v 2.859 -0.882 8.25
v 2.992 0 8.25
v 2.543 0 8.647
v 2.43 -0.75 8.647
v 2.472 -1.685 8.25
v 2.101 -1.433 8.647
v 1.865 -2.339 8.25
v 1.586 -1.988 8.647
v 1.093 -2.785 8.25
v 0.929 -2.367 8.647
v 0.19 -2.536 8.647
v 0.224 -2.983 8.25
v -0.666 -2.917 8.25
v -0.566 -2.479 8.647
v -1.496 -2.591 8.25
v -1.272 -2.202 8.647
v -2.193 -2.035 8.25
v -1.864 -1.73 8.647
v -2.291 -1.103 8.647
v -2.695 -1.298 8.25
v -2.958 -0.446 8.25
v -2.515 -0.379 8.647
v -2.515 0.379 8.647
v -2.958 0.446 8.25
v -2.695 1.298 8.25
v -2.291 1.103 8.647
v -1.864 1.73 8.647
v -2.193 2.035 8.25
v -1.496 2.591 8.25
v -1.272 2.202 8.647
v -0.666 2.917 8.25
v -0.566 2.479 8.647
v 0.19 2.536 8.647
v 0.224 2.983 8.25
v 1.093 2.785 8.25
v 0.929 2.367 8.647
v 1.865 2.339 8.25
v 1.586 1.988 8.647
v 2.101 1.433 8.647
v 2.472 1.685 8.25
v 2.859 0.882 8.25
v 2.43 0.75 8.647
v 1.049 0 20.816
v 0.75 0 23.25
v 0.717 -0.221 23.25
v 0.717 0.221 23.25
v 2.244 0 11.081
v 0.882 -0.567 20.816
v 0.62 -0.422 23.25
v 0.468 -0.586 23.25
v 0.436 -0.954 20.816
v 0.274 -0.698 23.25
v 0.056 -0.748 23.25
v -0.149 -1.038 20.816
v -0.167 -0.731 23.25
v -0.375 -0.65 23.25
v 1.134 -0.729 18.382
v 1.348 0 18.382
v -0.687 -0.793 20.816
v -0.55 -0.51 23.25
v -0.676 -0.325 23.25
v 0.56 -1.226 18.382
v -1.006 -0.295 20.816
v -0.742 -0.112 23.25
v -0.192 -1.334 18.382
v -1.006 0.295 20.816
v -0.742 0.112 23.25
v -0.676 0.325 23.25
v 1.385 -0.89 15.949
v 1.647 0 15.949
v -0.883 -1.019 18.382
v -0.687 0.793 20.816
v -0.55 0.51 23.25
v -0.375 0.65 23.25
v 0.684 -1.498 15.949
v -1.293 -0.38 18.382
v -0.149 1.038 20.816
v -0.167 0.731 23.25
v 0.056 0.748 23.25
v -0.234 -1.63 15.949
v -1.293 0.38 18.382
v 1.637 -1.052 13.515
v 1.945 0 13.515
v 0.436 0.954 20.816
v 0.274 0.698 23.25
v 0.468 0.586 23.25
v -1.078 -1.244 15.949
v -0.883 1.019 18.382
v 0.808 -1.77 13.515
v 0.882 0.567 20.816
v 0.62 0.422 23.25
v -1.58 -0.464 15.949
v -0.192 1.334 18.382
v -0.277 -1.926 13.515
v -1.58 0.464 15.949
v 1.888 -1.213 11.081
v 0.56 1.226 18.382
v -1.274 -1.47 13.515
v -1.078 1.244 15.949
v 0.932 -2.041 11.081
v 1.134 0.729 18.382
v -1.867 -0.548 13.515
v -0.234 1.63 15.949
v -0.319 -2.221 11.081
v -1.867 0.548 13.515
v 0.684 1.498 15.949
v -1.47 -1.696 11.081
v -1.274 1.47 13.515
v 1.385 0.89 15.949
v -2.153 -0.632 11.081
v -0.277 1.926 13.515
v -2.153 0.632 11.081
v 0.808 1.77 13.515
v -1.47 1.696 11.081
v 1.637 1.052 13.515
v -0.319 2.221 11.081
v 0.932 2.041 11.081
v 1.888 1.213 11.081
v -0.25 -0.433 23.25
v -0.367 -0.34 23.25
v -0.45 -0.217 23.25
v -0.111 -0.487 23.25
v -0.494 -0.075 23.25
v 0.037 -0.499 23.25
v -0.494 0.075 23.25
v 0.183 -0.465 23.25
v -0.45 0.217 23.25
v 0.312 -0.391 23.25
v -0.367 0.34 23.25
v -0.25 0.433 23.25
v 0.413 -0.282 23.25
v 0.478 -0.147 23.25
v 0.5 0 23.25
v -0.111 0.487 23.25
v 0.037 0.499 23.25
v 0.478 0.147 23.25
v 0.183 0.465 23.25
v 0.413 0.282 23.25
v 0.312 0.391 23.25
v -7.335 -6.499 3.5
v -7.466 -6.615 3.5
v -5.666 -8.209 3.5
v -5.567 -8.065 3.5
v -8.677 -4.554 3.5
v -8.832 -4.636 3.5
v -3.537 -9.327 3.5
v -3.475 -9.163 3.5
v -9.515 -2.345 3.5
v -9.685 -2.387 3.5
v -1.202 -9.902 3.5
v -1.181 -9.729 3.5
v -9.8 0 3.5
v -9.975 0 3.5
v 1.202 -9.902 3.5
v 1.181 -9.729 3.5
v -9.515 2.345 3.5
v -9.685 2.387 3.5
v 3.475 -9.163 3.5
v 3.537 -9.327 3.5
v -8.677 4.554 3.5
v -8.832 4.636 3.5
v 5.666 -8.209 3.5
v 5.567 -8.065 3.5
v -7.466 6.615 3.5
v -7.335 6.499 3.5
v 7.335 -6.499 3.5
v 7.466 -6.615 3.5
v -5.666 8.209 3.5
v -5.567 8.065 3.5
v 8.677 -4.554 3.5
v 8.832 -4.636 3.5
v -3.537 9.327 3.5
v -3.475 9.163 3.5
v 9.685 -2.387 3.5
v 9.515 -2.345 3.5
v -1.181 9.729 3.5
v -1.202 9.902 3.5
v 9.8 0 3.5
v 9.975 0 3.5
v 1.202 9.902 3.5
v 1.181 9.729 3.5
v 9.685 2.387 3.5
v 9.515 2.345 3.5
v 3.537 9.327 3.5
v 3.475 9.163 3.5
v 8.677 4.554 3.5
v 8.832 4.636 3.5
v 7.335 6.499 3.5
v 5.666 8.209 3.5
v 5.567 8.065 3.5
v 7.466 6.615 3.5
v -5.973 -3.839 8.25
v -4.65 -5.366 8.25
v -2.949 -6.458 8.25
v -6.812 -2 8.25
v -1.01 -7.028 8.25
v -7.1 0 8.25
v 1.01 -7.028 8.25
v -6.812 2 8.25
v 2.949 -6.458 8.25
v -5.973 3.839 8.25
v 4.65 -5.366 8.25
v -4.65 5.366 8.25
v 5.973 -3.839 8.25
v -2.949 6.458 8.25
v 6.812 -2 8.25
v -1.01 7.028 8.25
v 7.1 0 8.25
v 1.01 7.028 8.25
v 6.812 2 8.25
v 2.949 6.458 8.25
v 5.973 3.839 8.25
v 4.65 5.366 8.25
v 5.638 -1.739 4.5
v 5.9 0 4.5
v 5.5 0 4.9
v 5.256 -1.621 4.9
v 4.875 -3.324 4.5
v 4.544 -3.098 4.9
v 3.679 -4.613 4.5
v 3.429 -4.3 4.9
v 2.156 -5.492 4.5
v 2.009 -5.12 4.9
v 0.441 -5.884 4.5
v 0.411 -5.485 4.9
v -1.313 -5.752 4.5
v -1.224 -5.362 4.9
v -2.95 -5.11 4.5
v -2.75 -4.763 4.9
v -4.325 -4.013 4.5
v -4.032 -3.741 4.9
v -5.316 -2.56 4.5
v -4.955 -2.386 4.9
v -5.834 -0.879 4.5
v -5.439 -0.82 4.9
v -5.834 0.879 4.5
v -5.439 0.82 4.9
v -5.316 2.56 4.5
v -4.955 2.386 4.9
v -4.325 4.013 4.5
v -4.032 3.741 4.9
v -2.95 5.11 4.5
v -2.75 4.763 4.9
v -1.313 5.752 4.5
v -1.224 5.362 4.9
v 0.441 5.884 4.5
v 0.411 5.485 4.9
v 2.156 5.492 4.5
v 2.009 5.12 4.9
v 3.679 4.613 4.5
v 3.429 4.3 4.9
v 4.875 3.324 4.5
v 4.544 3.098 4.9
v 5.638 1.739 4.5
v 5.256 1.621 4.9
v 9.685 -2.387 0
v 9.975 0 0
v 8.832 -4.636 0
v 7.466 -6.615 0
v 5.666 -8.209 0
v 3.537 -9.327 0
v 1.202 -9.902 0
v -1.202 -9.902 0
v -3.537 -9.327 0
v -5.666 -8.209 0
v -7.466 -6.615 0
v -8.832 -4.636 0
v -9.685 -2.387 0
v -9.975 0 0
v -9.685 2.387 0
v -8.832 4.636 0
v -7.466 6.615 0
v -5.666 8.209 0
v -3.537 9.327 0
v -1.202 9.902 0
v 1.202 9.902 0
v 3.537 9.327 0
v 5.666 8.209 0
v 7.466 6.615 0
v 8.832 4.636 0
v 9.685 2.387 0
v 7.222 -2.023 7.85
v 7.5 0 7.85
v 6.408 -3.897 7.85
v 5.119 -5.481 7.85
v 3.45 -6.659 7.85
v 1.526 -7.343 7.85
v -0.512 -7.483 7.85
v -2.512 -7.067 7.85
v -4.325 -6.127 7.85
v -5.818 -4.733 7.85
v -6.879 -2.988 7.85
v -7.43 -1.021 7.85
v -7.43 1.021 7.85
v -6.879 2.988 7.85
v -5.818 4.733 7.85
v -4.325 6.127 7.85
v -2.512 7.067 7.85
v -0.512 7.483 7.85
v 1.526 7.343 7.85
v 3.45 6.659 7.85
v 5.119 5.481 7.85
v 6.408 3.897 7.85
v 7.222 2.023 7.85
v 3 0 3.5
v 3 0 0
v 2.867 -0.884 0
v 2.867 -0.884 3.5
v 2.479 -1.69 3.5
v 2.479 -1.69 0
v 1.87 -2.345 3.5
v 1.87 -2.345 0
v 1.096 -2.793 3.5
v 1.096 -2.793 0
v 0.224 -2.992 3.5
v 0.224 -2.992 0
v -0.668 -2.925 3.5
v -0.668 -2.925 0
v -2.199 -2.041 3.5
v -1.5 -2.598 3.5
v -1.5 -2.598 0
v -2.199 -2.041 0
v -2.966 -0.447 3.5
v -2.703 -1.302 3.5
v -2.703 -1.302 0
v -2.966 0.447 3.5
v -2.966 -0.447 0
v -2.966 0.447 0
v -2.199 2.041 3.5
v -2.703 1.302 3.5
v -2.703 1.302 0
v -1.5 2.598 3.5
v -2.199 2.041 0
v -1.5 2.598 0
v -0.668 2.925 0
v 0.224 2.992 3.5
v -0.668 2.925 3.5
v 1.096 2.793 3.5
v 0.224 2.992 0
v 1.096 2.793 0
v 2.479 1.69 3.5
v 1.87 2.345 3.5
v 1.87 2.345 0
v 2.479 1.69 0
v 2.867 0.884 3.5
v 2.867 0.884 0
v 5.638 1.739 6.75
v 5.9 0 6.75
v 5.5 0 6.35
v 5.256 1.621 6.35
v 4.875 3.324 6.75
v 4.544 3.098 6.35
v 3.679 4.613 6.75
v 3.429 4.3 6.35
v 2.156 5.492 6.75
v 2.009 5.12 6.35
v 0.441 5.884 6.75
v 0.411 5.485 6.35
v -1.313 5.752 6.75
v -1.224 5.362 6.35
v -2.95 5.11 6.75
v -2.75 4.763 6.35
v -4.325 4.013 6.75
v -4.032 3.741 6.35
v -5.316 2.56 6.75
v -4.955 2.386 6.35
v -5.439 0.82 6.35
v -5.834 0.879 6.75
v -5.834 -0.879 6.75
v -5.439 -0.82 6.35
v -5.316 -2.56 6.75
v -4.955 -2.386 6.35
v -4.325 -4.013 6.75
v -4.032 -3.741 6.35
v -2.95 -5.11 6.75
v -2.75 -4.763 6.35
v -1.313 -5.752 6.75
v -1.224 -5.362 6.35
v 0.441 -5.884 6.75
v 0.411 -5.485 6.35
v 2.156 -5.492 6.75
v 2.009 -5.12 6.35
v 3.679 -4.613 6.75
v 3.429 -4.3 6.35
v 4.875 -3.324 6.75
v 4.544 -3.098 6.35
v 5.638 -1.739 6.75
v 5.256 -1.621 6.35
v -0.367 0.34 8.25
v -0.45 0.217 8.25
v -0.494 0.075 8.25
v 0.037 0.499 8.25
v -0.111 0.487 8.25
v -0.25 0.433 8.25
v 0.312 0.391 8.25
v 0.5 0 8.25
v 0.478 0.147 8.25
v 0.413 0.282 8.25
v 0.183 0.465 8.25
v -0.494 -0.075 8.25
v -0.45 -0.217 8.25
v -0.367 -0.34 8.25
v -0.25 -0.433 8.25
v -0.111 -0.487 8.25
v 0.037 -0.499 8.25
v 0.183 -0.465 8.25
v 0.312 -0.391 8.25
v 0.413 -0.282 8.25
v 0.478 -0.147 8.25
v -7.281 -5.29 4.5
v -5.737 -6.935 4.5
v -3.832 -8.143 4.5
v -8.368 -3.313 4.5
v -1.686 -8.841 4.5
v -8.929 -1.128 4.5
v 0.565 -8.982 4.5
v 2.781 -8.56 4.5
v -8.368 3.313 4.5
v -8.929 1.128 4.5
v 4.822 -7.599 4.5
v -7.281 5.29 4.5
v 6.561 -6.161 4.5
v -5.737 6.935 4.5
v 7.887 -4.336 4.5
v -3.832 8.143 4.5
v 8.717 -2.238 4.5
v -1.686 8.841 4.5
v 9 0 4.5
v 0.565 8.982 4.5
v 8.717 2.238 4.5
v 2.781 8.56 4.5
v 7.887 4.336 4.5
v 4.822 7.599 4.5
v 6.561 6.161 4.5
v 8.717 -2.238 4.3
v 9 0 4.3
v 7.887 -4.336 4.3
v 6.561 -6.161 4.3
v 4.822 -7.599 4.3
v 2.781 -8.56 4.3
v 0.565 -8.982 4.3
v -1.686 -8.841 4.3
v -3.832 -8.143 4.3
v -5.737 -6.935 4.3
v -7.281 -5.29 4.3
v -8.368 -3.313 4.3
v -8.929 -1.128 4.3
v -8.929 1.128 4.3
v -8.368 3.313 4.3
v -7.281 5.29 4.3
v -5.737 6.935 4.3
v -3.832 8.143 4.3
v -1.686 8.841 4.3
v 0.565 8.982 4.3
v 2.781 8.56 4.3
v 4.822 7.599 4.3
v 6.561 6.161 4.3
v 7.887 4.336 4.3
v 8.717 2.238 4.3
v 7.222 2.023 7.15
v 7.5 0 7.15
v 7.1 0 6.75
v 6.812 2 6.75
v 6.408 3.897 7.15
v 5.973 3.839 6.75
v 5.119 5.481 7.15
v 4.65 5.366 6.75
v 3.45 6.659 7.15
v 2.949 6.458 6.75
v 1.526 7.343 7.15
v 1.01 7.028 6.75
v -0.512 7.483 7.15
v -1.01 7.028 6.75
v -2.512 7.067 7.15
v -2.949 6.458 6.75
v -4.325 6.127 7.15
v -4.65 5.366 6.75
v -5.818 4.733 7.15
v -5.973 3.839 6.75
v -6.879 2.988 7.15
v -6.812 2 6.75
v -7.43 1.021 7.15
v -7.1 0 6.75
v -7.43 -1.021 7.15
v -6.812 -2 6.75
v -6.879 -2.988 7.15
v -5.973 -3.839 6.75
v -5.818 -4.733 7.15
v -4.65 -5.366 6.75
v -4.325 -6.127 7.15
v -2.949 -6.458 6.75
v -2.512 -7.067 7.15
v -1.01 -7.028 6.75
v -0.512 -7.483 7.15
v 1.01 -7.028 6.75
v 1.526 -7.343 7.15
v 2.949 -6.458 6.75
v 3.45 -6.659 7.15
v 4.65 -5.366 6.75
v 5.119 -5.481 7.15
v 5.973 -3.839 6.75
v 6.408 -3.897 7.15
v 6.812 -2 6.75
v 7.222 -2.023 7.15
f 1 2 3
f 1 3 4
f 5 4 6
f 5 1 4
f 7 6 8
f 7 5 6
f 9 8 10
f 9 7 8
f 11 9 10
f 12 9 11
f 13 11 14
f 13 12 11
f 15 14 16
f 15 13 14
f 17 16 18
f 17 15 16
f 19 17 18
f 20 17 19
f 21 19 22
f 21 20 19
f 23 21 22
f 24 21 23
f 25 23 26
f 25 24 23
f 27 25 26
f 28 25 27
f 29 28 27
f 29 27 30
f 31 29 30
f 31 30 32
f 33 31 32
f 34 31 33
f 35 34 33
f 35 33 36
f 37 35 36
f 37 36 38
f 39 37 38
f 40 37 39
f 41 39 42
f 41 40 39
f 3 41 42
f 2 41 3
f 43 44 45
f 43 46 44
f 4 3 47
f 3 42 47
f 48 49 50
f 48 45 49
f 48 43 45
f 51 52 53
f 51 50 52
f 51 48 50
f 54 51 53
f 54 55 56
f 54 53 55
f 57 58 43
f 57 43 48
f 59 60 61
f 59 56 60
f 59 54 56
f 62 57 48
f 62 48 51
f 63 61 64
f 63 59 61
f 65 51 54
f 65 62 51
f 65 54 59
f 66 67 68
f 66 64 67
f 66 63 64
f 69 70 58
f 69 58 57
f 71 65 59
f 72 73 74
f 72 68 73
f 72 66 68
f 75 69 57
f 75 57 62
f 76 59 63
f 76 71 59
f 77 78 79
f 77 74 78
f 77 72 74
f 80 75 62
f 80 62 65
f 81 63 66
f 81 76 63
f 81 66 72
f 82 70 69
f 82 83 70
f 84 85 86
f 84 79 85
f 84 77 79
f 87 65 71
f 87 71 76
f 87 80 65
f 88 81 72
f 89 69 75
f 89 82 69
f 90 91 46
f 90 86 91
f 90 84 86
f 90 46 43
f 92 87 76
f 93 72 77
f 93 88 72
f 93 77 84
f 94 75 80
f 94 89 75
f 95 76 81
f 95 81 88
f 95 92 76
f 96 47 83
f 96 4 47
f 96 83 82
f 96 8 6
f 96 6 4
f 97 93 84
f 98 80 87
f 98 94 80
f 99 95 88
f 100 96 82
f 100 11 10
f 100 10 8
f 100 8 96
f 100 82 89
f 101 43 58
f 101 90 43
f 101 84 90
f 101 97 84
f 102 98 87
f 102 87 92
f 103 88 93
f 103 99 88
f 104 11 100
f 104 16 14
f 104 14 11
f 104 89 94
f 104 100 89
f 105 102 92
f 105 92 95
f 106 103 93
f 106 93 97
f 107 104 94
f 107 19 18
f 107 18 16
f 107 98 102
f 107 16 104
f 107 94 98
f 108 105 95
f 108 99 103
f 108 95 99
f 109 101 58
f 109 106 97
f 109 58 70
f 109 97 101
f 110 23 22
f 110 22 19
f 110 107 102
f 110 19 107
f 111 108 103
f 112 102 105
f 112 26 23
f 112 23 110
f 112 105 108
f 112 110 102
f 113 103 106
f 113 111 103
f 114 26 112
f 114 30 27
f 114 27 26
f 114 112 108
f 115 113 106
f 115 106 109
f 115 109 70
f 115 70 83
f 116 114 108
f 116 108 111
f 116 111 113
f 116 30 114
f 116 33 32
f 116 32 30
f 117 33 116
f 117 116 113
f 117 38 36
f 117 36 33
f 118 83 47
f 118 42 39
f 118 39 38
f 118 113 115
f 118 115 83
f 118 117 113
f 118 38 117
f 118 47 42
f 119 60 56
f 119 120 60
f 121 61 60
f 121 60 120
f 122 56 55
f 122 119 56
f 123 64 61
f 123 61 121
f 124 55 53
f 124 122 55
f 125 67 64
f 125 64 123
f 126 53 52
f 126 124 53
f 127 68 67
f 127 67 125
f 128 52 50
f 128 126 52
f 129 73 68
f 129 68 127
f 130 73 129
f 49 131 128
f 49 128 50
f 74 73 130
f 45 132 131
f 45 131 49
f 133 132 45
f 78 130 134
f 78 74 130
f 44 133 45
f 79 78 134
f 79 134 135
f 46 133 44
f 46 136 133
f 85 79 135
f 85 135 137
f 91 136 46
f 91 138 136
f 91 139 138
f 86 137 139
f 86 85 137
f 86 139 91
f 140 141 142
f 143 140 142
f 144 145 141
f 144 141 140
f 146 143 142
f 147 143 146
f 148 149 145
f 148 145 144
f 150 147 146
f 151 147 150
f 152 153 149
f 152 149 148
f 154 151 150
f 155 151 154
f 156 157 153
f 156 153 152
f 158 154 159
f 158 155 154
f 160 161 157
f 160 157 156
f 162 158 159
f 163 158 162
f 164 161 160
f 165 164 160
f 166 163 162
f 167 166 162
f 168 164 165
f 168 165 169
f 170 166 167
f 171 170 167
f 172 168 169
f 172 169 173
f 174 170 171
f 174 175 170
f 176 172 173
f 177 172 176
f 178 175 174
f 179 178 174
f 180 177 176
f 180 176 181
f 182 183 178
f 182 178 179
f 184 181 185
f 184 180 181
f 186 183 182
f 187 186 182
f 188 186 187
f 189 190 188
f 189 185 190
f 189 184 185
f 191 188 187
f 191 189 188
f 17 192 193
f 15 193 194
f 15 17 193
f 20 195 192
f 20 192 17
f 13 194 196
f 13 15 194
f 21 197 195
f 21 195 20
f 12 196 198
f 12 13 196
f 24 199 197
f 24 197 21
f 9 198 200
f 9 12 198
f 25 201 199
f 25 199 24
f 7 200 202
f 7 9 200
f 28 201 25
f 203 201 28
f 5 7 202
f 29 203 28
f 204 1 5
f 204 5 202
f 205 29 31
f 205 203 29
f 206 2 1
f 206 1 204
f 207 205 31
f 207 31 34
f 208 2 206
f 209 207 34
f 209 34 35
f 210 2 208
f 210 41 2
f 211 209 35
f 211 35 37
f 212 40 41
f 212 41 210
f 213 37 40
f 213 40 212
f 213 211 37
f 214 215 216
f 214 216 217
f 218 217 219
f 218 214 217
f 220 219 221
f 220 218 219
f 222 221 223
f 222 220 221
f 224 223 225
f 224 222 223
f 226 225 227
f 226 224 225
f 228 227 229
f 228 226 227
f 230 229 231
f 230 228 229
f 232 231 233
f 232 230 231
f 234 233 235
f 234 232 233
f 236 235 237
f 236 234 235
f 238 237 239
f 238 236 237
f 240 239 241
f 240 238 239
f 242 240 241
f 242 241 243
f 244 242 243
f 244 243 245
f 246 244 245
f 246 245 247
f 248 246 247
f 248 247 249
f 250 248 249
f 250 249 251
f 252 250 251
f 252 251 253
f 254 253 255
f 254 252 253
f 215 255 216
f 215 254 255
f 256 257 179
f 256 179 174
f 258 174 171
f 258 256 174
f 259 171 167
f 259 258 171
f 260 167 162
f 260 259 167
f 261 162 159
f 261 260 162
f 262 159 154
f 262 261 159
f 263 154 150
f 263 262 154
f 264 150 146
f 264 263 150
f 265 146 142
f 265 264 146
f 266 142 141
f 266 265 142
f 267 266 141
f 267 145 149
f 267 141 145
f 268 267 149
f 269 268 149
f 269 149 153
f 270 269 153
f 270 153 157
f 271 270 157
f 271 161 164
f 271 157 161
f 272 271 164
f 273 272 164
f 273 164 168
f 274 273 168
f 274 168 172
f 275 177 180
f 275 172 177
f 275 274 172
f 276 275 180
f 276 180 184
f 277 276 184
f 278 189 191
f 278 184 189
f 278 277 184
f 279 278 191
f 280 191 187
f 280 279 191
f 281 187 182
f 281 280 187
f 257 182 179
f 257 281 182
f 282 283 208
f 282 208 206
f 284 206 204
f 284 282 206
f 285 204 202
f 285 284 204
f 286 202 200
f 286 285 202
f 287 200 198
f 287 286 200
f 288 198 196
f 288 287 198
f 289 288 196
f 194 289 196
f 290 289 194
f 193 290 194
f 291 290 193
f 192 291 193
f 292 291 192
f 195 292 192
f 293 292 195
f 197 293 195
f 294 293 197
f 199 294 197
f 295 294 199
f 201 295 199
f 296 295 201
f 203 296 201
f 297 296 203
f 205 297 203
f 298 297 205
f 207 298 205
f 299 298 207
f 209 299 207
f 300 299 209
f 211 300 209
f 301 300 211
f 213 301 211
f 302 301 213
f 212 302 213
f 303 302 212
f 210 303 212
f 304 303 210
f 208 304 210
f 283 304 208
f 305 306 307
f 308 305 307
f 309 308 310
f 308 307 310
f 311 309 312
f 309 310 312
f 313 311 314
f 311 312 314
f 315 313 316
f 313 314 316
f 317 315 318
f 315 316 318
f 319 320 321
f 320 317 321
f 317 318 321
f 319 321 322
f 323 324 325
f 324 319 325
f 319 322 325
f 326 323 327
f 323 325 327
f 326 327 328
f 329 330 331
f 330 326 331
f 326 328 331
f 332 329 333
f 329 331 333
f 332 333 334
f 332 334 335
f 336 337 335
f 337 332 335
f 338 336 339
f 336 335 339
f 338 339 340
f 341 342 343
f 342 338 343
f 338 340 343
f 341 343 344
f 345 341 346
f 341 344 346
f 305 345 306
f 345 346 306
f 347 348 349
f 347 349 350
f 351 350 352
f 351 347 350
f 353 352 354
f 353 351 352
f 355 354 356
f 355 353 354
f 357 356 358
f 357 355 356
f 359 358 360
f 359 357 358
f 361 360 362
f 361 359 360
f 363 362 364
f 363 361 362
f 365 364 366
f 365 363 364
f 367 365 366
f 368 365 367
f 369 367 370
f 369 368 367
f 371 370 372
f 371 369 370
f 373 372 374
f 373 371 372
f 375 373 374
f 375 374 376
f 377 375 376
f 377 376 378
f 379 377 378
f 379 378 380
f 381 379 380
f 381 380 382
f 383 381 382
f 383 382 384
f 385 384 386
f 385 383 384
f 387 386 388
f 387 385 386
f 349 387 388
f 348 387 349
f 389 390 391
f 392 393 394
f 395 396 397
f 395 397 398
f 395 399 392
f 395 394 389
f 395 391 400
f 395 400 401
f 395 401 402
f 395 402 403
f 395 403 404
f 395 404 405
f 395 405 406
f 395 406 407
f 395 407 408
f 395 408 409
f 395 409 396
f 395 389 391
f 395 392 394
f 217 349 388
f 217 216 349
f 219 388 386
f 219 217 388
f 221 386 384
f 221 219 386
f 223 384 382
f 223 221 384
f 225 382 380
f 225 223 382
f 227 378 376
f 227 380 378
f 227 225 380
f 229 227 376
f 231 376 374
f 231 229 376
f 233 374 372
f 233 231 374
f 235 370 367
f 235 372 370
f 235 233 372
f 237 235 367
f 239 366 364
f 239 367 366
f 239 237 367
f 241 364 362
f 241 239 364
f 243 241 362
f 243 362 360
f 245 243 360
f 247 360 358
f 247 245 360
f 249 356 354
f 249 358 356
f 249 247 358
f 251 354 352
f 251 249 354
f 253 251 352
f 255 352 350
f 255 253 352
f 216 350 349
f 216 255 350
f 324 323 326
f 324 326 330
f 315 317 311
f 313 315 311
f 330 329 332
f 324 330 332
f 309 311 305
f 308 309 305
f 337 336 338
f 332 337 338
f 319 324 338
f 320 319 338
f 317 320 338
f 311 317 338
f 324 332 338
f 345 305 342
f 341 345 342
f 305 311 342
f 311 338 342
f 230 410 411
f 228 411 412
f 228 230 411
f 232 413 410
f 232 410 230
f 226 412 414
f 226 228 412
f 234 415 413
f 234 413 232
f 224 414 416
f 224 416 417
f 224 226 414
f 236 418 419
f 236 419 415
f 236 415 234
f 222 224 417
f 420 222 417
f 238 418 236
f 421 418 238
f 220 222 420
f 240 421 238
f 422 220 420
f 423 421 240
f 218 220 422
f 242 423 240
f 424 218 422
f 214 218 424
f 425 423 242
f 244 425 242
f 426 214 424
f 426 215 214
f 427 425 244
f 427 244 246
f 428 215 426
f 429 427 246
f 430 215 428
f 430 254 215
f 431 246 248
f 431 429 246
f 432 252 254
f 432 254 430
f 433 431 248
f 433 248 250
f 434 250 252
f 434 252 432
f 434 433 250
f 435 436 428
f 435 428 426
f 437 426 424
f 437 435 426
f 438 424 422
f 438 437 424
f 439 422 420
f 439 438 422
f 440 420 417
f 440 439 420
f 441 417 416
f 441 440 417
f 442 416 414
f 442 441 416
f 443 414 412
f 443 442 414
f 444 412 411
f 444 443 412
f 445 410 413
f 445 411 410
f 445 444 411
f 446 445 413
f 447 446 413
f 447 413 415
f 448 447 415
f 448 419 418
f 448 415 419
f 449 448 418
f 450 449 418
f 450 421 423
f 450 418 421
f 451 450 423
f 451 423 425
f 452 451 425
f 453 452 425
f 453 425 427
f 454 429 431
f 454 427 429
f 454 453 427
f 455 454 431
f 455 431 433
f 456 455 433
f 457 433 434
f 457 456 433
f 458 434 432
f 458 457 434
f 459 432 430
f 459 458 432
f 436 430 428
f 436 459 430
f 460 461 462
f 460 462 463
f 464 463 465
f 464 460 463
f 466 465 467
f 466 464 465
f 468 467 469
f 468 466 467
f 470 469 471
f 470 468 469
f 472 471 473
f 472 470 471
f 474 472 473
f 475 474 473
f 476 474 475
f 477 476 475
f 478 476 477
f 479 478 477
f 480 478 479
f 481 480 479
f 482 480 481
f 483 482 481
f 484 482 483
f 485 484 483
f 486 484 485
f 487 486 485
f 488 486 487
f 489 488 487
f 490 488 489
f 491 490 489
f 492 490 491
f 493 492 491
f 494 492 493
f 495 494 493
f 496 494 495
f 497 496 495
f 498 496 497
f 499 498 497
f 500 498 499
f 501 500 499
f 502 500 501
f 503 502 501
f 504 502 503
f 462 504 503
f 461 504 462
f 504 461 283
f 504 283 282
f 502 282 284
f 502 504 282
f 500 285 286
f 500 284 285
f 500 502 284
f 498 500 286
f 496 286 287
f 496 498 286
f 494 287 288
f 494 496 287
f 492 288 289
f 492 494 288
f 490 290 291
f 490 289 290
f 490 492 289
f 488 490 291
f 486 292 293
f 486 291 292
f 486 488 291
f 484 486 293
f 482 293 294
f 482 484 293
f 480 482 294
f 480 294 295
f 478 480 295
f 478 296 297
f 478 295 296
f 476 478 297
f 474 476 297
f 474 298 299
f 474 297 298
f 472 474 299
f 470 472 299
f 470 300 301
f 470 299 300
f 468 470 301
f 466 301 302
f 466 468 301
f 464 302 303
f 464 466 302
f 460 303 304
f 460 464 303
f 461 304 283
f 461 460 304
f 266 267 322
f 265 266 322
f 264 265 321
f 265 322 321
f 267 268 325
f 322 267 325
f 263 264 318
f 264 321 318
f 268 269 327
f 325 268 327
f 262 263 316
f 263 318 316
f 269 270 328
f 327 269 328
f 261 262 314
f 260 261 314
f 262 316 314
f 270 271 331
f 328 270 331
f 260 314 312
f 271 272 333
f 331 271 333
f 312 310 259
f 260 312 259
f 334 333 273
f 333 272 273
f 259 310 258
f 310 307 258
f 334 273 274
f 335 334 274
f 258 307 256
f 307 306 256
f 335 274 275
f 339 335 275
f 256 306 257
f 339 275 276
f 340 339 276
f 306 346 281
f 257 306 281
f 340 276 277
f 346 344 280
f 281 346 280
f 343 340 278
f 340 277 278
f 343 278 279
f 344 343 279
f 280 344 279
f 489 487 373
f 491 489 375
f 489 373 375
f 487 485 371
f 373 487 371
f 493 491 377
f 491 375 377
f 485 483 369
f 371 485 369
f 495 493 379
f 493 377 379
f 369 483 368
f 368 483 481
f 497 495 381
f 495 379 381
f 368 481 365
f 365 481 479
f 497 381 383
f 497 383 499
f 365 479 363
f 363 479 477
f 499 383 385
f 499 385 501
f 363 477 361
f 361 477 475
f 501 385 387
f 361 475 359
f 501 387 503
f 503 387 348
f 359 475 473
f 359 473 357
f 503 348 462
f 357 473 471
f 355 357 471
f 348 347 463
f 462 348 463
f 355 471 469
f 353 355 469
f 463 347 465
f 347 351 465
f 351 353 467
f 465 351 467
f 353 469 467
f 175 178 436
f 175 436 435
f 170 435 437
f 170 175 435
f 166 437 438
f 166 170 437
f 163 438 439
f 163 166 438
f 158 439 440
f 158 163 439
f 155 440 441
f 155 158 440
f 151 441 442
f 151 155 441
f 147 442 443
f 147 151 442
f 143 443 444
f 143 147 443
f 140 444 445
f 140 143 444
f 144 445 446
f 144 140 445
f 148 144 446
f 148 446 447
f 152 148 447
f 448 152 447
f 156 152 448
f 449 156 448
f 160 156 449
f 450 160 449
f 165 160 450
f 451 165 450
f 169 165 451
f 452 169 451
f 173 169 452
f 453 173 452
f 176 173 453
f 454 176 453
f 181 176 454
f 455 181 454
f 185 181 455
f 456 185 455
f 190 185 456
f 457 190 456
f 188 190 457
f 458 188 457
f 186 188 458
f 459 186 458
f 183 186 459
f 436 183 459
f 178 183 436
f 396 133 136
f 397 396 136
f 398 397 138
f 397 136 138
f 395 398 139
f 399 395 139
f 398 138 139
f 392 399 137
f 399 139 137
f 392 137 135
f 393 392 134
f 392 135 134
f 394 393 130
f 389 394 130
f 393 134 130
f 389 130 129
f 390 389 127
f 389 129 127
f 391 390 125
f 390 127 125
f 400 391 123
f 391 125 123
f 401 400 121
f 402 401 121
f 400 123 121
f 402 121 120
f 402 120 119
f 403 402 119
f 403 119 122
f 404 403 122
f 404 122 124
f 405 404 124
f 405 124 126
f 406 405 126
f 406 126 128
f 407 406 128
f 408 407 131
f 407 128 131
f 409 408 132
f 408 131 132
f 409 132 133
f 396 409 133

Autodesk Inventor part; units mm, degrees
ref_plane "YZ Plane" through (0, 0, 0) normal (1, 0, 0) x (0, 1, 0)
ref_plane "XZ Plane" through (0, 0, 0) normal (0, 1, 0) x (-1, 0, 0)
ref_plane "XY Plane" through (0, 0, 0) normal (0, 0, 1) x (1, 0, 0)
sketch "Sketch1" plane through (0, 0, 0) normal (0, 0, 1) x (1, 0, 0)
  point P0 (0, 0)
sketch "Sketch2" plane through (0, 0, 0) normal (0, 0, 1) x (1, 0, 0)
  circle A0 centre (0, 0) radius 9.975
  circle A1 centre (0, 0) radius 3
  dimension "d0" = 19.95
  dimension "d1" = 6
extrude "Extrusion1" add sketch "Sketch2" along normal blind 3.5
sketch "Sketch3" plane through (0, 0, 3.5) normal (0, 0, 1) x (1, 0, 0)
  circle A0 centre (0, 0) radius 9
  dimension "d9" = 18
extrude "Extrusion2" add sketch "Sketch3" along normal blind 1
sketch "Sketch4" plane through (0, 0, 4.5) normal (0, 0, 1) x (1, 0, 0)
  circle A0 centre (0, 0) radius 5.5
  dimension "nozzleInner" = 11
extrude "Extrusion3" add sketch "Sketch4" along normal blind 2.25
chamfer "Chamfer1" distance 0.8 angle 45 1 edges at (-9, 0, 3.5)
sketch "Sketch5" plane through (0, 0, 6.75) normal (0, 0, 1) x (1, 0, 0)
  circle A0 centre (0, 0) radius 7.5
  dimension "d24" = 15
extrude "Extrusion4" add sketch "Sketch5" along normal blind 1.5
ref_plane "Work Plane2" through (0, 0, 23.25) normal (0, 0, 1) x (1, 0, 0)
sketch "Sketch8" plane through (0, 0, 23.25) normal (0, 0, 1) x (1, 0, 0)
  circle A0 centre (0, 0) radius 0.5
  circle A1 centre (0, 0) radius 0.75
  dimension "d39" = 1
  dimension "d40" = 1.5
extrude "Extrusion7" add sketch "Sketch8" against normal blind 15
draft "FaceDraft1" angle 7 pull direction (0, 0, 1) faces at (0.7476, -0.0603, 13.25) fixed edges at (-0.75, 0, 23.25)
chamfer "Chamfer2" distance 0.4 angle 45 5 edges at (-7.5, 0, 6.75) (-7.5, 0, 8.25) (-5.5, 0, 4.5) (-5.5, 0, 6.75) (-2.5918, 0, 8.25)
equation "\"d1\" = di"
equation "\"d4\" = d10"
equation "\"nozzleInner\" = 0.5 * dO"
equation "\"d39\" = iTip"
equation "\"d40\" = oTip"
equation "\"iTip\" = 1"
equation "\"oTip\" = 1.5"
equation "\"di\" = 6"
equation "\"d10\" = 3.5"
equation "\"dO\" = 22"
properties part number "nozzle-tip1-0402" material "Steel, Mild"
